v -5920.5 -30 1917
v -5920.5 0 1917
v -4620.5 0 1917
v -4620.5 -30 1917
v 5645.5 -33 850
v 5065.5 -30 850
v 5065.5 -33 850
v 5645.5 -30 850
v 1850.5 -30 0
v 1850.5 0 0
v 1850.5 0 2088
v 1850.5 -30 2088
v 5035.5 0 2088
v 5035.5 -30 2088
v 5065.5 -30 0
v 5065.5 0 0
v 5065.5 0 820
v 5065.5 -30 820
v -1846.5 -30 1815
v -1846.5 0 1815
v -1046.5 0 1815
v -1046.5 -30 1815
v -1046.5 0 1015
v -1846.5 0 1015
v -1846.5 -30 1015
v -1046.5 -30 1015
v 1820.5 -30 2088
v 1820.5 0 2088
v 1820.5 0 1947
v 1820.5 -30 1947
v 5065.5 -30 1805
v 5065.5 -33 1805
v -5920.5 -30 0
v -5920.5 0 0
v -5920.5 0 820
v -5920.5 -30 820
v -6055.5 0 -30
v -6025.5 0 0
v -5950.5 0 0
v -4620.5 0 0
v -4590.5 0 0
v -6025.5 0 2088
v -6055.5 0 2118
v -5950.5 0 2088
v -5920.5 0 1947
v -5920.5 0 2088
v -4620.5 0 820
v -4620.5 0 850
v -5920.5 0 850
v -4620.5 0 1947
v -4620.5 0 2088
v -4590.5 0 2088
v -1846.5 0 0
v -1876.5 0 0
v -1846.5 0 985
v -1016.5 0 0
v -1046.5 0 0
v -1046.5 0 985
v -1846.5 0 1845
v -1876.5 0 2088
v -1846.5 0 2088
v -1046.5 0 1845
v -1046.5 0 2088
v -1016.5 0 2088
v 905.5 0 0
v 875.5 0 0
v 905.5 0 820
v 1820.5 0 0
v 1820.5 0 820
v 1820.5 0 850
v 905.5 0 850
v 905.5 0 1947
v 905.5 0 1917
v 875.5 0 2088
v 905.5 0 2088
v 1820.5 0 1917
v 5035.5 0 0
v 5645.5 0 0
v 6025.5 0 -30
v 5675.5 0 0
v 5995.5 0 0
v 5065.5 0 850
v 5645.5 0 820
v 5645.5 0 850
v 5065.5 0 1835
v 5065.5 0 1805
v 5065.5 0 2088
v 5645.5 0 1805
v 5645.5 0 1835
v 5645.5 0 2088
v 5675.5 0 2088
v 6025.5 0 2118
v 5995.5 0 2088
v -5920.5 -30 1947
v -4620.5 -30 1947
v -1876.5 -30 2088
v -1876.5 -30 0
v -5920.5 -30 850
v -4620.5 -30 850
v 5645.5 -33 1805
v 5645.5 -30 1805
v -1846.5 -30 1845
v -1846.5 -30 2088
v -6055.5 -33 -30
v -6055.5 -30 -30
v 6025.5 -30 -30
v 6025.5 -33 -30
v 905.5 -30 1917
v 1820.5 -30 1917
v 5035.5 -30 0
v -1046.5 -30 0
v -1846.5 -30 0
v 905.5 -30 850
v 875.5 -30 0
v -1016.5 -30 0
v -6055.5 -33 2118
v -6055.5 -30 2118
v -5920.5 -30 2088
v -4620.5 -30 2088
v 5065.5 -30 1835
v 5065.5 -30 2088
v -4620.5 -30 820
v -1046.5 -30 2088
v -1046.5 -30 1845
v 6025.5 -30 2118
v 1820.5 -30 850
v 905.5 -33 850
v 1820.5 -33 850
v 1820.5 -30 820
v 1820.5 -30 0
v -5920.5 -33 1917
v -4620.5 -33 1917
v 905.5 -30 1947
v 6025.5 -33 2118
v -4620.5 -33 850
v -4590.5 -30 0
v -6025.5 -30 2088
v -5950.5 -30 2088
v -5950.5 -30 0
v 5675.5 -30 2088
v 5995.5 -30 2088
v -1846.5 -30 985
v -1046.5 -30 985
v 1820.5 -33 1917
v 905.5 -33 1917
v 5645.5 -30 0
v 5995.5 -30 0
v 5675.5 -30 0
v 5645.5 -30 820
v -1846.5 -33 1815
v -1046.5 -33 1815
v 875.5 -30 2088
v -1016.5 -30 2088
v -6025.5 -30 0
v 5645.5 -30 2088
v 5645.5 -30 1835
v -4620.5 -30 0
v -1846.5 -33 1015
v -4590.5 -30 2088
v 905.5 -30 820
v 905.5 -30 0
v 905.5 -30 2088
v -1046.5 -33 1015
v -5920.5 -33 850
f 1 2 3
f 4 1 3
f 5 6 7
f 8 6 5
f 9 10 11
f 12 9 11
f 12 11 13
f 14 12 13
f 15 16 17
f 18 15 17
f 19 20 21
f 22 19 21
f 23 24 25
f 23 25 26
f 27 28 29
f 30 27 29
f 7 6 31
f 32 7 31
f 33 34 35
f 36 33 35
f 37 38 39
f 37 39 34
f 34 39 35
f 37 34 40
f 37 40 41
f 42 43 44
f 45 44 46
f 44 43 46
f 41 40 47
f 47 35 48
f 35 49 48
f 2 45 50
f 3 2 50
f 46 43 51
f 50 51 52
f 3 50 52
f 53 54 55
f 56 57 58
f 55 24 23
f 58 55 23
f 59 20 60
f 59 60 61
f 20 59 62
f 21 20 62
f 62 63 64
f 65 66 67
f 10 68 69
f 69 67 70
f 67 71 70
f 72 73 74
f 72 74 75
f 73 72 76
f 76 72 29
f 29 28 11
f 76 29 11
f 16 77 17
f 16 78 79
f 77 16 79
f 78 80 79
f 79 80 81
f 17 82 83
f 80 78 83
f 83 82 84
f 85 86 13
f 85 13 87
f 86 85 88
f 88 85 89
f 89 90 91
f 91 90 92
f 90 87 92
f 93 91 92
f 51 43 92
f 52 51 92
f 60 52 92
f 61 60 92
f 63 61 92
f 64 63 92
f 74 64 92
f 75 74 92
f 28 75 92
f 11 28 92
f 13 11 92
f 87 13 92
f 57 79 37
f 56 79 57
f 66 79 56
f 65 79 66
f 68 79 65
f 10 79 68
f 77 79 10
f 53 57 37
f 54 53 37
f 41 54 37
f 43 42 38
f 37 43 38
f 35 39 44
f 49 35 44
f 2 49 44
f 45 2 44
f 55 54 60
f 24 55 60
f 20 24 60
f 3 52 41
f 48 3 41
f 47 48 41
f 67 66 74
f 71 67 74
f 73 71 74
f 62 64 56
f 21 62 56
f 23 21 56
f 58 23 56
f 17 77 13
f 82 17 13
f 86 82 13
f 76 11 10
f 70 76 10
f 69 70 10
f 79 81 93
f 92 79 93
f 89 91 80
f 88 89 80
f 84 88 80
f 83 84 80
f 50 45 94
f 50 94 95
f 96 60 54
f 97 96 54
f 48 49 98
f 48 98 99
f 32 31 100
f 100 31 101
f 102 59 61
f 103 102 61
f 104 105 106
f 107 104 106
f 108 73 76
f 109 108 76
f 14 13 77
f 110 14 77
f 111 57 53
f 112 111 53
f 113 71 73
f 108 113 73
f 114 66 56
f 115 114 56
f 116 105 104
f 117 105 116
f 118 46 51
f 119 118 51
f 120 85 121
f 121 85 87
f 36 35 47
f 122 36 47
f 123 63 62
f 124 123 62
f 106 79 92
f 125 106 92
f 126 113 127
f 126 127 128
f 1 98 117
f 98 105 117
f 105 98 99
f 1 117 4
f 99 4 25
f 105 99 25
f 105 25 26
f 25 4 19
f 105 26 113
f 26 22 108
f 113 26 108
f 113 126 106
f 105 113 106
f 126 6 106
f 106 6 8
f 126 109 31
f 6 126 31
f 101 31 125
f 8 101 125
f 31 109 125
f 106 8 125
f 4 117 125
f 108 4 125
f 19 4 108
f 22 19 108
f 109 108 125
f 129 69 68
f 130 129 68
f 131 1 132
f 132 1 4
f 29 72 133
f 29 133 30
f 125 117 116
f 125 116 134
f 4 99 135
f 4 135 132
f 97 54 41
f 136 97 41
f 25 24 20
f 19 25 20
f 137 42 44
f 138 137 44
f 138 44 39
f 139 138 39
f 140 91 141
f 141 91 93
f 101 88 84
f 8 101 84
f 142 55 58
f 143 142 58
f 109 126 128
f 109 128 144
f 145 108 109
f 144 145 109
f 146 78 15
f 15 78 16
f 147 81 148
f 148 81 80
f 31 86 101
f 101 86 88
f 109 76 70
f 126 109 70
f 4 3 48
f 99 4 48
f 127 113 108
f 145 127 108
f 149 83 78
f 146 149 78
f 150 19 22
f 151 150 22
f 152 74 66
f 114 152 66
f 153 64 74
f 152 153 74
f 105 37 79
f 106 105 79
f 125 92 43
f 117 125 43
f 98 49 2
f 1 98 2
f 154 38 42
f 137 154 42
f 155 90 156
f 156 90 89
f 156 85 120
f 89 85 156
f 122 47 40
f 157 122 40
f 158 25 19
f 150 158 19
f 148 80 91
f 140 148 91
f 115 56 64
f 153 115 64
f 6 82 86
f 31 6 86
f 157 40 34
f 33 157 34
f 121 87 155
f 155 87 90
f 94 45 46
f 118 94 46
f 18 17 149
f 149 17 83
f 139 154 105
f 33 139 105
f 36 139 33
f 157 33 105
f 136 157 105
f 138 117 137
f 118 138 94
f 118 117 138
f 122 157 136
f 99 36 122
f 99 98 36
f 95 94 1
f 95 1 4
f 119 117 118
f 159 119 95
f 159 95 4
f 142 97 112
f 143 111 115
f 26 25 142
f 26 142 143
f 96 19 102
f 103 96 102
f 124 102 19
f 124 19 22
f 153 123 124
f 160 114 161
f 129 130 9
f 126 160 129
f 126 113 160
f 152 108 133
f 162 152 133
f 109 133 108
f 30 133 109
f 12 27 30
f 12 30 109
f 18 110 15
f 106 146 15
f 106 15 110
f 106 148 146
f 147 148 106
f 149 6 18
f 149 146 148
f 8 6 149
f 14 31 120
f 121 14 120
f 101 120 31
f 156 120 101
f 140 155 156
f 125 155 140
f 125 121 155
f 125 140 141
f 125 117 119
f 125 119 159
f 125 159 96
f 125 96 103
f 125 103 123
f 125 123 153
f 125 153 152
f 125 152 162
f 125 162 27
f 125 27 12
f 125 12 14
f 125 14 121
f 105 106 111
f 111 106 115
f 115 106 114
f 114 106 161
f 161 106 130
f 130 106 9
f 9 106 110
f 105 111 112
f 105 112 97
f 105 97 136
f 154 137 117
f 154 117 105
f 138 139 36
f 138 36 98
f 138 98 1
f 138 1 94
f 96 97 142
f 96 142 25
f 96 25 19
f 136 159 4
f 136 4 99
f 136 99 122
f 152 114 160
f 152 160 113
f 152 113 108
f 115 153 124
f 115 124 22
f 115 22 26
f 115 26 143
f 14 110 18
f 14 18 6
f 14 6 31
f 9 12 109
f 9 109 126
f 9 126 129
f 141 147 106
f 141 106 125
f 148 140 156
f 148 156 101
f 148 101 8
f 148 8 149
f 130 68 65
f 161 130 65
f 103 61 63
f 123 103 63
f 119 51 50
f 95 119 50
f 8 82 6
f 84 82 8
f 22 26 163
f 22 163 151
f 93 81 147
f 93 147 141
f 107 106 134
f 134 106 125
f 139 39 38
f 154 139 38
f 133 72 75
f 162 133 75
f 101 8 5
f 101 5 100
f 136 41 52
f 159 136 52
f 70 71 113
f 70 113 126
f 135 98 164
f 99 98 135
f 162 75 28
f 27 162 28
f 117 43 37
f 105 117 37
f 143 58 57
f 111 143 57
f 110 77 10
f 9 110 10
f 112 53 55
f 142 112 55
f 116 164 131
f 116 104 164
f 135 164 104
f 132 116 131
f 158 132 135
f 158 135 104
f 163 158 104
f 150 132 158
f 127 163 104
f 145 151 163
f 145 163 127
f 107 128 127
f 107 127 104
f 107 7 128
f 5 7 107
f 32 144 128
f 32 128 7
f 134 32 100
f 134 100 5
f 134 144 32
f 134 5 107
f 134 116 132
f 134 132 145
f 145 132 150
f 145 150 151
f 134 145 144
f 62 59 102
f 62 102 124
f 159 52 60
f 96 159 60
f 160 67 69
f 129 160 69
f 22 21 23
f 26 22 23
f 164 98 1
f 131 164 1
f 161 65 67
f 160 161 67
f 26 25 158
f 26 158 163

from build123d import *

# Parameters (mm, degrees)
F0_W     = 30
F0_H     = 2088
F0_W_2   = 1300
F0_H_2   = 30
F0_W_3   = 800
F0_W_4   = 915
F0_W_5   = 580
F1_DEPTH = 30
F2_W     = 12081
F2_H     = 2148
F2_W_2   = 1300
F2_H_2   = 1067
F2_W_3   = 800
F2_H_3   = 800
F2_W_4   = 915
F2_W_5   = 580
F2_H_4   = 955
F3_DEPTH = 3


with BuildPart() as f1:
    # F0 (on Front) → F1 (new body)
    with BuildSketch(Plane.XZ):
        Polygon((875.5, 0), (0, 0), (-1016.5, 0), (-1046.5, 0), (-1846.5, 0), (-1876.5, 0), (-4590.5, 0), (-4620.5, 0), (-5920.5, 0), (-5950.5, 0), (-6025.5, 0), (-6025.5, 2088), (-5950.5, 2088), (-5920.5, 2088), (-4620.5, 2088), (-4590.5, 2088), (-3474.5, 2088), (-3474.5, 2118), (-6055.5, 2118), (-6055.5, -30), (6025.5, -30), (6025.5, 0), (5995.5, 0), (5675.5, 0), (5645.5, 0), (5065.5, 0), (5035.5, 0), (1850.5, 0), (1820.5, 0), (905.5, 0), align=None)
        Polygon((-1046.5, 2088), (-1016.5, 2088), (875.5, 2088), (905.5, 2088), (1575.5, 2088), (1575.5, 2118), (-3474.5, 2118), (-3474.5, 2088), (-1876.5, 2088), (-1846.5, 2088), align=None)
        Polygon((1575.5, 2118), (1575.5, 2088), (1820.5, 2088), (1850.5, 2088), (5035.5, 2088), (5065.5, 2088), (5645.5, 2088), (5675.5, 2088), (5995.5, 2088), (6025.5, 2088), (6025.5, 2118), align=None)
        with Locations((6010.5, 1044)):
            Rectangle(F0_W, F0_H)
        with Locations((-5270.5, 1932)):
            Rectangle(F0_W_2, F0_H_2)
        Polygon((-4620.5, 0), (-4590.5, 0), (-4590.5, 2088), (-4620.5, 2088), (-4620.5, 1947), (-4620.5, 1917), (-4620.5, 850), (-4620.5, 820), align=None)
        with Locations((-5270.5, 835)):
            Rectangle(F0_W_2, F0_H_2)
        Polygon((-5950.5, 0), (-5920.5, 0), (-5920.5, 820), (-5920.5, 850), (-5920.5, 1917), (-5920.5, 1947), (-5920.5, 2088), (-5950.5, 2088), align=None)
        Polygon((-1876.5, 0), (-1846.5, 0), (-1846.5, 985), (-1846.5, 1015), (-1846.5, 1815), (-1846.5, 1845), (-1846.5, 2088), (-1876.5, 2088), align=None)
        with Locations((-1446.5, 1830)):
            Rectangle(F0_W_3, F0_H_2)
        with Locations((-1446.5, 1000)):
            Rectangle(F0_W_3, F0_H_2)
        Polygon((-1046.5, 0), (-1016.5, 0), (-1016.5, 2088), (-1046.5, 2088), (-1046.5, 1845), (-1046.5, 1815), (-1046.5, 1015), (-1046.5, 985), align=None)
        Polygon((875.5, 2088), (875.5, 0), (905.5, 0), (905.5, 820), (905.5, 850), (905.5, 1917), (905.5, 1947), (905.5, 2088), align=None)
        with Locations((1363, 1932)):
            Rectangle(F0_W_4, F0_H_2)
        with Locations((1363, 835)):
            Rectangle(F0_W_4, F0_H_2)
        Polygon((1820.5, 820), (1820.5, 0), (1850.5, 0), (1850.5, 2088), (1820.5, 2088), (1820.5, 1947), (1820.5, 1917), (1820.5, 850), align=None)
        Polygon((5035.5, 2088), (5035.5, 0), (5065.5, 0), (5065.5, 820), (5065.5, 850), (5065.5, 1805), (5065.5, 1835), (5065.5, 2088), align=None)
        with Locations((5355.5, 1820)):
            Rectangle(F0_W_5, F0_H_2)
        with Locations((5355.5, 835)):
            Rectangle(F0_W_5, F0_H_2)
        Polygon((5645.5, 820), (5645.5, 0), (5675.5, 0), (5675.5, 2088), (5645.5, 2088), (5645.5, 1835), (5645.5, 1805), (5645.5, 850), align=None)
    extrude(amount=F1_DEPTH)


with BuildPart() as f3:
    # F2 (on face) → F3 (new body)
    with BuildSketch(Plane.XZ.offset(30)):
        with Locations((-15, 1044)):
            Rectangle(F2_W, F2_H)
        with Locations((-5270.5, 1383.5)):
            Rectangle(F2_W_2, F2_H_2, mode=Mode.SUBTRACT)
        with Locations((-1446.5, 1415)):
            Rectangle(F2_W_3, F2_H_3, mode=Mode.SUBTRACT)
        with Locations((1363, 1383.5)):
            Rectangle(F2_W_4, F2_H_2, mode=Mode.SUBTRACT)
        with Locations((5355.5, 1327.5)):
            Rectangle(F2_W_5, F2_H_4, mode=Mode.SUBTRACT)
    extrude(amount=F3_DEPTH)


solid = Compound([f1.part, f3.part])
